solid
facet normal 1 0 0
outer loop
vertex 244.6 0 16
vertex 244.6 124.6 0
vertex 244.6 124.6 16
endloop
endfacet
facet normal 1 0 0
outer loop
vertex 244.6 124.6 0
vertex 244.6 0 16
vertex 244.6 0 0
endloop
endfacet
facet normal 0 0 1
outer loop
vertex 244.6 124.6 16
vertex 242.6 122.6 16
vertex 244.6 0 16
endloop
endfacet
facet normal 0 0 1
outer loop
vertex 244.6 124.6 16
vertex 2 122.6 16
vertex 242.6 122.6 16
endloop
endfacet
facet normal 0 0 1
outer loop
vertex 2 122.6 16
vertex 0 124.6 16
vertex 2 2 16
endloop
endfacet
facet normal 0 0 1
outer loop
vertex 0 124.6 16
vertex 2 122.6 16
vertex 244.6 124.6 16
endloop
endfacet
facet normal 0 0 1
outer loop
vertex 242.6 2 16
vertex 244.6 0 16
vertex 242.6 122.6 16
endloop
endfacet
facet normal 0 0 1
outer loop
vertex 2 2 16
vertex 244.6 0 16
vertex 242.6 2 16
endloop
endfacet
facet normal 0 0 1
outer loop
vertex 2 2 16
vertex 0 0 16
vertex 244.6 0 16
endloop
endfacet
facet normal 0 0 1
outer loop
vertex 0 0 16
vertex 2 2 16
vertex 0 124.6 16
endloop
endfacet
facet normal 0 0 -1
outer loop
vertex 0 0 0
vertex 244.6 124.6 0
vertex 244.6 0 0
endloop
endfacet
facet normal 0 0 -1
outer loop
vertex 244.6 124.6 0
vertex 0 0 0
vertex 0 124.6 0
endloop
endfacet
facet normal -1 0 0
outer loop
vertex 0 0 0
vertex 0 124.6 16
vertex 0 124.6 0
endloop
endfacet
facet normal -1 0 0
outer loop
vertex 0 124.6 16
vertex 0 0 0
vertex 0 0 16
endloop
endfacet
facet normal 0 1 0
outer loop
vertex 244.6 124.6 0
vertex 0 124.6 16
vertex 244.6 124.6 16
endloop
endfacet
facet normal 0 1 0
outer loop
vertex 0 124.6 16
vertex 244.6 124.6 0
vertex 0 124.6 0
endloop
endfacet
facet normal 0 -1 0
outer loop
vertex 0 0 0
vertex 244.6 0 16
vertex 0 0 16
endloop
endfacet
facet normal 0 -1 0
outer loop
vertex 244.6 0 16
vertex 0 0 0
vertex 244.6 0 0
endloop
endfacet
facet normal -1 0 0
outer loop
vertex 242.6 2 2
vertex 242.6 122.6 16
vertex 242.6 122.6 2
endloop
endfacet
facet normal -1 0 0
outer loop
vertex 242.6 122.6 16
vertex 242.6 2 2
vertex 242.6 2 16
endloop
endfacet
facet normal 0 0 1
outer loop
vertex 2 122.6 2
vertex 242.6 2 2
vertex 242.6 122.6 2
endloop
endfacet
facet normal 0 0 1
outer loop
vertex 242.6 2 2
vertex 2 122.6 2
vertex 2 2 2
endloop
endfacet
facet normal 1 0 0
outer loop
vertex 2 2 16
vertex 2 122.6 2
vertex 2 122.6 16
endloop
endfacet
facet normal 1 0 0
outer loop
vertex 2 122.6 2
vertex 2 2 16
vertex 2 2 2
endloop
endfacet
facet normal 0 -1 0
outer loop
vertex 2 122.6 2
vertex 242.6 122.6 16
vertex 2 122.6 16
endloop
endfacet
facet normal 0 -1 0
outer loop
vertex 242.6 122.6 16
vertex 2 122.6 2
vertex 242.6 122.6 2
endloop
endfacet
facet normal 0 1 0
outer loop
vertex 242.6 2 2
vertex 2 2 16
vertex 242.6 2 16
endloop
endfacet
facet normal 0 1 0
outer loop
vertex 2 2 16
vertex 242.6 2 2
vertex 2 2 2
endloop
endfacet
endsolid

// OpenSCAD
// Slip-on lid for chicken feeder
// Fits feeder body: 240 x 120 mm outer size
// Designed for 2 mm body walls
// Clearance: 0.6 mm total around body
// Lid wall/top thickness: 2 mm
// Lid skirt depth: 14 mm

body_w = 240;
body_d = 120;

clearance = 0.6;   // total clearance added to body dimensions
lid_wall = 2;
lid_top = 2;
skirt_depth = 14;

$fn = 64;

inner_w = body_w + clearance;
inner_d = body_d + clearance;

outer_w = inner_w + 2 * lid_wall;
outer_d = inner_d + 2 * lid_wall;
lid_h = lid_top + skirt_depth;

difference() {
    // Outer lid
    cube([outer_w, outer_d, lid_h], center=false);

    // Hollow underside
    translate([lid_wall, lid_wall, lid_top])
        cube([inner_w, inner_d, skirt_depth + 0.1], center=false);
}
